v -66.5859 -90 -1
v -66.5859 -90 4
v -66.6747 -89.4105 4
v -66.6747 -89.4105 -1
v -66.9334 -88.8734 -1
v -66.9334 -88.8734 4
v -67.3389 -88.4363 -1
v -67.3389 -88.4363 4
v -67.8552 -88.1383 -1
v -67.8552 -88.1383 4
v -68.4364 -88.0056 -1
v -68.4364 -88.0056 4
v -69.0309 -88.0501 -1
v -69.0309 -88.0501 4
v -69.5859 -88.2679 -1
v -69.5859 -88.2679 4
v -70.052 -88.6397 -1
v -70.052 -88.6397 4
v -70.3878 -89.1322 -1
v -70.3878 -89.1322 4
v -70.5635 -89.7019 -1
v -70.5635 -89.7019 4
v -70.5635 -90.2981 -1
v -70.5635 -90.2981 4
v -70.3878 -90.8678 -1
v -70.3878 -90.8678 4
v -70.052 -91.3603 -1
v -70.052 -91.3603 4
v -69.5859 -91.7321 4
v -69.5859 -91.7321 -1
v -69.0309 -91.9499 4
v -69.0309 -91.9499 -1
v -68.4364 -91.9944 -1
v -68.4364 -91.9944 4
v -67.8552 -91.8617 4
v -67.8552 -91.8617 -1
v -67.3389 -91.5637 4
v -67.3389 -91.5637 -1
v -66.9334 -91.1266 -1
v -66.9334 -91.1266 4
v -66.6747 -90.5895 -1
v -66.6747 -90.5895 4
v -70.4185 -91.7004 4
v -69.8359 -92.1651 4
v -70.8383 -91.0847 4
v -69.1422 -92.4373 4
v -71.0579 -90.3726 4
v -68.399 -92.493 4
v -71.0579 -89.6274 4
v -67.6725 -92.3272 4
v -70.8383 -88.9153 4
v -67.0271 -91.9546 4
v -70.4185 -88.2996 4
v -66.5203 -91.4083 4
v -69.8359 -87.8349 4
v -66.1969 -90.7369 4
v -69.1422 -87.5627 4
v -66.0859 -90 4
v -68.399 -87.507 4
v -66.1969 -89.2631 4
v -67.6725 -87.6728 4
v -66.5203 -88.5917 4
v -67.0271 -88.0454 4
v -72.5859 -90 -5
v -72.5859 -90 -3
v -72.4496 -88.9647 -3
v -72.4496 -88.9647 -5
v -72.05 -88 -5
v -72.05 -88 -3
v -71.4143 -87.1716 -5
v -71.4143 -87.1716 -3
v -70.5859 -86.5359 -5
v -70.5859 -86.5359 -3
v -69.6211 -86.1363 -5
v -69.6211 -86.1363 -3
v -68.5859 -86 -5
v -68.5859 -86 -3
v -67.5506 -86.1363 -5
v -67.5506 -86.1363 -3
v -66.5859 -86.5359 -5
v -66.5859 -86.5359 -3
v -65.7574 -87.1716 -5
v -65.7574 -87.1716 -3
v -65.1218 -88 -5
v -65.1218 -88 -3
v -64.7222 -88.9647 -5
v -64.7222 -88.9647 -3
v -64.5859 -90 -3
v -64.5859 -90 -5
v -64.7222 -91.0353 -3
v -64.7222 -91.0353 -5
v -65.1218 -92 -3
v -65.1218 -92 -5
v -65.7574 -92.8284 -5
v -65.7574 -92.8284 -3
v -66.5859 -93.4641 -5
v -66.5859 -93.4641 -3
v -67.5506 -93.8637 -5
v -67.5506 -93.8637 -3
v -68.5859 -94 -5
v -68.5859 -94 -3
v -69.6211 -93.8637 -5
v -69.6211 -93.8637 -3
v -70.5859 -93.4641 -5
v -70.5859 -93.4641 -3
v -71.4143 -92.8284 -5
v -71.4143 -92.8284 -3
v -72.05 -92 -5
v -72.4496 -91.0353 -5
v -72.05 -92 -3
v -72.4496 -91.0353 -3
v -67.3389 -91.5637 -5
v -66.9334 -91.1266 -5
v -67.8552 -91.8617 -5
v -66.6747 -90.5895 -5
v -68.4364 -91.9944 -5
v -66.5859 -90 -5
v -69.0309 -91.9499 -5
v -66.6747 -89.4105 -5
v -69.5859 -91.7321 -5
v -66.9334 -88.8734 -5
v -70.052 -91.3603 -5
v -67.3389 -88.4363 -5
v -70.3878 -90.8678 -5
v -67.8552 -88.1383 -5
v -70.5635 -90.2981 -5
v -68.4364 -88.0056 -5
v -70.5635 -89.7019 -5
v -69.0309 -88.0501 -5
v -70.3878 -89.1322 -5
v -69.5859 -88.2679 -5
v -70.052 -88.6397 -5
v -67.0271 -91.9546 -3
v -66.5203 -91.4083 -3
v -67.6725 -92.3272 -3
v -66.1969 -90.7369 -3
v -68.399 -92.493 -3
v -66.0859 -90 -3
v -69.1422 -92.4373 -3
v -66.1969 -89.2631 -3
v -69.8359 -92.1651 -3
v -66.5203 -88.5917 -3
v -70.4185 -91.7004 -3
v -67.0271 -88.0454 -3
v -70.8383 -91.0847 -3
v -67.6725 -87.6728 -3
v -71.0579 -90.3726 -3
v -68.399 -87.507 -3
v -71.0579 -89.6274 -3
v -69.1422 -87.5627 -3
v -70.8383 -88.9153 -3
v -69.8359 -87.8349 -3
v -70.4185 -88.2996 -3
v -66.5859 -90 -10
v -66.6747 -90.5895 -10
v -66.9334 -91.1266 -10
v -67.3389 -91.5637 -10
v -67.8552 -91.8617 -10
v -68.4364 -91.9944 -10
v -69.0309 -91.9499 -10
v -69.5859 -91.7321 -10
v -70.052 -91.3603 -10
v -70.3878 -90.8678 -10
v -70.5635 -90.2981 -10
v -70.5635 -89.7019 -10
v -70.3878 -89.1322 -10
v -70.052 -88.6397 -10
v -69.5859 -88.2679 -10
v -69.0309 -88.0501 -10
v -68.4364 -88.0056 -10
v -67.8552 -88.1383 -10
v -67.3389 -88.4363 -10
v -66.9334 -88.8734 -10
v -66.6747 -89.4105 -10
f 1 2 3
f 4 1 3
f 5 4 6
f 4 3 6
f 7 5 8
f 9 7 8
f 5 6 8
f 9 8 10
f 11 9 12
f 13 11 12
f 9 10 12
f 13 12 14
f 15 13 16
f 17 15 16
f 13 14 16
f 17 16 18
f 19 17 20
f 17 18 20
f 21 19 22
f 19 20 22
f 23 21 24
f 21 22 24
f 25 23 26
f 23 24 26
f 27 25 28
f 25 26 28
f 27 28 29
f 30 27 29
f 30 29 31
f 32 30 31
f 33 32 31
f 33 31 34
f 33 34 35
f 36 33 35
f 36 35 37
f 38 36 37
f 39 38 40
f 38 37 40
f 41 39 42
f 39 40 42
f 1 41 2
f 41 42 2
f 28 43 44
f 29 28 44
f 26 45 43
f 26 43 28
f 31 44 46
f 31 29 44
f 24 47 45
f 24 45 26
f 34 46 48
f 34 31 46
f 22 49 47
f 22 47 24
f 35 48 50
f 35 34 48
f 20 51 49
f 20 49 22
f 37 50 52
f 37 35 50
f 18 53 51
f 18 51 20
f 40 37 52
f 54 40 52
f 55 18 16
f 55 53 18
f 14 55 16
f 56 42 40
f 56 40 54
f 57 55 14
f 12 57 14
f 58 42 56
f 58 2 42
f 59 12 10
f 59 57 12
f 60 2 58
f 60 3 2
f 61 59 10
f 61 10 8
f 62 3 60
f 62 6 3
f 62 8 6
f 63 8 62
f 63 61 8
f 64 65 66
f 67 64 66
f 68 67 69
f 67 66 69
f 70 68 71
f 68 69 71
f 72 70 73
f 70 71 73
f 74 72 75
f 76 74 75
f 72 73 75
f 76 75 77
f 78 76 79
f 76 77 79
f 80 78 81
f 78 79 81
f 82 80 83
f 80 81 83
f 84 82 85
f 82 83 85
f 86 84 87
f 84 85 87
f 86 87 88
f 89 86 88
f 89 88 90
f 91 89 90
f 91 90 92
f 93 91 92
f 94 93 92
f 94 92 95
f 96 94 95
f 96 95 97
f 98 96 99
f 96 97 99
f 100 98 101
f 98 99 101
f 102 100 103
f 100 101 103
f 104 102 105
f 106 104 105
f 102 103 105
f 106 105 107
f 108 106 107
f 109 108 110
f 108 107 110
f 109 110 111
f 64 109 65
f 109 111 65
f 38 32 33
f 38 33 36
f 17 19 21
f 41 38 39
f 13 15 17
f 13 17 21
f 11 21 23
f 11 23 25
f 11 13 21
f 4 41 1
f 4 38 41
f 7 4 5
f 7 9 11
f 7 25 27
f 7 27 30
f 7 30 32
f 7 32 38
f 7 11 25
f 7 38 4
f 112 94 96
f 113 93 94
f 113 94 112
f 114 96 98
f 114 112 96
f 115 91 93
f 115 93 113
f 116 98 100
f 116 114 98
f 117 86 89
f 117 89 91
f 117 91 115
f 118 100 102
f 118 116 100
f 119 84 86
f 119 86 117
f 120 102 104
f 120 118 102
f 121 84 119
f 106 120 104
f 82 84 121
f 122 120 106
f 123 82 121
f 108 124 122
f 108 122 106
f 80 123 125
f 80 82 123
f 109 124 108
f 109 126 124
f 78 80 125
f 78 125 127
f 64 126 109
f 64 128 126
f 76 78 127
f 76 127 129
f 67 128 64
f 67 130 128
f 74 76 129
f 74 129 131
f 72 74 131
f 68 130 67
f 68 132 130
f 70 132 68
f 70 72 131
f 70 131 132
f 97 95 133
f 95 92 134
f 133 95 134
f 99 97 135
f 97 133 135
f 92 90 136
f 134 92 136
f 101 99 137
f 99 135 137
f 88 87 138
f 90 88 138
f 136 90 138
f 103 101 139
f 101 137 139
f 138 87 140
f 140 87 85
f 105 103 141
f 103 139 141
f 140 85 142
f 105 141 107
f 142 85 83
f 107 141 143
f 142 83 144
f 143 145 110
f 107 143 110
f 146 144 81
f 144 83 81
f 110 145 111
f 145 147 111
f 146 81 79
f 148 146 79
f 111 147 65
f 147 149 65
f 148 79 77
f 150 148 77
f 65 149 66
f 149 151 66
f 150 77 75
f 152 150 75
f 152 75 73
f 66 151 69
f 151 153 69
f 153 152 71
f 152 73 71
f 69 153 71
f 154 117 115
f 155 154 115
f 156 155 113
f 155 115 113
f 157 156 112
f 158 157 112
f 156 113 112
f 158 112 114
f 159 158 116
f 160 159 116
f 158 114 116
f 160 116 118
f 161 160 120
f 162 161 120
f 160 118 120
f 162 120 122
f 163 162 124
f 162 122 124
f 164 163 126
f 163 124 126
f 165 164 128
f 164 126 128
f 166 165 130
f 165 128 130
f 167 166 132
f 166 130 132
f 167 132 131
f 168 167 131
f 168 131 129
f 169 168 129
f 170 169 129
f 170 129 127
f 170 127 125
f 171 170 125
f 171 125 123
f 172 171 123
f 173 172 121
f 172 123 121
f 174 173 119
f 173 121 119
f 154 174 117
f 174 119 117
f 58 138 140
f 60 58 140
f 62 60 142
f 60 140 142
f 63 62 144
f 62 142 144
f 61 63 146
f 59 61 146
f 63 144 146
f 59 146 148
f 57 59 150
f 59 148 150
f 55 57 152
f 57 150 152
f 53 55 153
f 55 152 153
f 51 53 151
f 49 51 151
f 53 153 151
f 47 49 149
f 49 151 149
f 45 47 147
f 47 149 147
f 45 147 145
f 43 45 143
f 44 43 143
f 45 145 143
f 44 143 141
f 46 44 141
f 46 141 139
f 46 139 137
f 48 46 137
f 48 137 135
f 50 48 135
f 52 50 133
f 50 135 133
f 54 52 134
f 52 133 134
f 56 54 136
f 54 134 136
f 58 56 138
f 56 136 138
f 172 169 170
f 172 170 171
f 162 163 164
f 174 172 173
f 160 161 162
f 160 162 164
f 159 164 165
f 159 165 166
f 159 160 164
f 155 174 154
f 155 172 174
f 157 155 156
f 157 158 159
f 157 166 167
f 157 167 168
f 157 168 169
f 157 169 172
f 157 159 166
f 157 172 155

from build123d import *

# Parameters (mm, degrees)
BOSS_EXTRUDE1_DEPTH      = 4
BOSS_EXTRUDE1_DEPTH_BACK = 3
SKETCH1_R                = 2.5
SKETCH2_R                = 4
BOSS_EXTRUDE2_DEPTH      = 2
SKETCH3_R                = 2
CUT_EXTRUDE1_DEPTH       = 5
SKETCH4_R                = 2
BOSS_EXTRUDE3_DEPTH      = 5


with BuildPart() as part:
    # Sketch1 → Boss-Extrude1 (new, two sides: drawn at the far end of the back side and taken through both)
    with BuildSketch(Plane.XY.offset(-BOSS_EXTRUDE1_DEPTH_BACK)):
        with Locations((-68.585871194, -90)):
            Circle(SKETCH1_R)
    extrude(amount=BOSS_EXTRUDE1_DEPTH + BOSS_EXTRUDE1_DEPTH_BACK)

    # Sketch2 → Boss-Extrude2 (add)
    with BuildSketch(Plane(origin=(0, 0, -3), x_dir=(-1, 0, 0), z_dir=(0, 0, -1))):
        with Locations((68.585871194, -90)):
            Circle(SKETCH2_R)
    extrude(amount=BOSS_EXTRUDE2_DEPTH)

    # Sketch3 → Cut-Extrude1 (cut)
    with BuildSketch(Plane.XY.offset(4)):
        with Locations((-68.585871194, -90)):
            Circle(SKETCH3_R)
    extrude(amount=-CUT_EXTRUDE1_DEPTH, mode=Mode.SUBTRACT)

    # Sketch4 → Boss-Extrude3 (add)
    with BuildSketch(Plane(origin=(0, 0, -5), x_dir=(-1, 0, 0), z_dir=(0, 0, -1))):
        with Locations((68.585871194, -90)):
            Circle(SKETCH4_R)
    extrude(amount=BOSS_EXTRUDE3_DEPTH)


solid = part.part
